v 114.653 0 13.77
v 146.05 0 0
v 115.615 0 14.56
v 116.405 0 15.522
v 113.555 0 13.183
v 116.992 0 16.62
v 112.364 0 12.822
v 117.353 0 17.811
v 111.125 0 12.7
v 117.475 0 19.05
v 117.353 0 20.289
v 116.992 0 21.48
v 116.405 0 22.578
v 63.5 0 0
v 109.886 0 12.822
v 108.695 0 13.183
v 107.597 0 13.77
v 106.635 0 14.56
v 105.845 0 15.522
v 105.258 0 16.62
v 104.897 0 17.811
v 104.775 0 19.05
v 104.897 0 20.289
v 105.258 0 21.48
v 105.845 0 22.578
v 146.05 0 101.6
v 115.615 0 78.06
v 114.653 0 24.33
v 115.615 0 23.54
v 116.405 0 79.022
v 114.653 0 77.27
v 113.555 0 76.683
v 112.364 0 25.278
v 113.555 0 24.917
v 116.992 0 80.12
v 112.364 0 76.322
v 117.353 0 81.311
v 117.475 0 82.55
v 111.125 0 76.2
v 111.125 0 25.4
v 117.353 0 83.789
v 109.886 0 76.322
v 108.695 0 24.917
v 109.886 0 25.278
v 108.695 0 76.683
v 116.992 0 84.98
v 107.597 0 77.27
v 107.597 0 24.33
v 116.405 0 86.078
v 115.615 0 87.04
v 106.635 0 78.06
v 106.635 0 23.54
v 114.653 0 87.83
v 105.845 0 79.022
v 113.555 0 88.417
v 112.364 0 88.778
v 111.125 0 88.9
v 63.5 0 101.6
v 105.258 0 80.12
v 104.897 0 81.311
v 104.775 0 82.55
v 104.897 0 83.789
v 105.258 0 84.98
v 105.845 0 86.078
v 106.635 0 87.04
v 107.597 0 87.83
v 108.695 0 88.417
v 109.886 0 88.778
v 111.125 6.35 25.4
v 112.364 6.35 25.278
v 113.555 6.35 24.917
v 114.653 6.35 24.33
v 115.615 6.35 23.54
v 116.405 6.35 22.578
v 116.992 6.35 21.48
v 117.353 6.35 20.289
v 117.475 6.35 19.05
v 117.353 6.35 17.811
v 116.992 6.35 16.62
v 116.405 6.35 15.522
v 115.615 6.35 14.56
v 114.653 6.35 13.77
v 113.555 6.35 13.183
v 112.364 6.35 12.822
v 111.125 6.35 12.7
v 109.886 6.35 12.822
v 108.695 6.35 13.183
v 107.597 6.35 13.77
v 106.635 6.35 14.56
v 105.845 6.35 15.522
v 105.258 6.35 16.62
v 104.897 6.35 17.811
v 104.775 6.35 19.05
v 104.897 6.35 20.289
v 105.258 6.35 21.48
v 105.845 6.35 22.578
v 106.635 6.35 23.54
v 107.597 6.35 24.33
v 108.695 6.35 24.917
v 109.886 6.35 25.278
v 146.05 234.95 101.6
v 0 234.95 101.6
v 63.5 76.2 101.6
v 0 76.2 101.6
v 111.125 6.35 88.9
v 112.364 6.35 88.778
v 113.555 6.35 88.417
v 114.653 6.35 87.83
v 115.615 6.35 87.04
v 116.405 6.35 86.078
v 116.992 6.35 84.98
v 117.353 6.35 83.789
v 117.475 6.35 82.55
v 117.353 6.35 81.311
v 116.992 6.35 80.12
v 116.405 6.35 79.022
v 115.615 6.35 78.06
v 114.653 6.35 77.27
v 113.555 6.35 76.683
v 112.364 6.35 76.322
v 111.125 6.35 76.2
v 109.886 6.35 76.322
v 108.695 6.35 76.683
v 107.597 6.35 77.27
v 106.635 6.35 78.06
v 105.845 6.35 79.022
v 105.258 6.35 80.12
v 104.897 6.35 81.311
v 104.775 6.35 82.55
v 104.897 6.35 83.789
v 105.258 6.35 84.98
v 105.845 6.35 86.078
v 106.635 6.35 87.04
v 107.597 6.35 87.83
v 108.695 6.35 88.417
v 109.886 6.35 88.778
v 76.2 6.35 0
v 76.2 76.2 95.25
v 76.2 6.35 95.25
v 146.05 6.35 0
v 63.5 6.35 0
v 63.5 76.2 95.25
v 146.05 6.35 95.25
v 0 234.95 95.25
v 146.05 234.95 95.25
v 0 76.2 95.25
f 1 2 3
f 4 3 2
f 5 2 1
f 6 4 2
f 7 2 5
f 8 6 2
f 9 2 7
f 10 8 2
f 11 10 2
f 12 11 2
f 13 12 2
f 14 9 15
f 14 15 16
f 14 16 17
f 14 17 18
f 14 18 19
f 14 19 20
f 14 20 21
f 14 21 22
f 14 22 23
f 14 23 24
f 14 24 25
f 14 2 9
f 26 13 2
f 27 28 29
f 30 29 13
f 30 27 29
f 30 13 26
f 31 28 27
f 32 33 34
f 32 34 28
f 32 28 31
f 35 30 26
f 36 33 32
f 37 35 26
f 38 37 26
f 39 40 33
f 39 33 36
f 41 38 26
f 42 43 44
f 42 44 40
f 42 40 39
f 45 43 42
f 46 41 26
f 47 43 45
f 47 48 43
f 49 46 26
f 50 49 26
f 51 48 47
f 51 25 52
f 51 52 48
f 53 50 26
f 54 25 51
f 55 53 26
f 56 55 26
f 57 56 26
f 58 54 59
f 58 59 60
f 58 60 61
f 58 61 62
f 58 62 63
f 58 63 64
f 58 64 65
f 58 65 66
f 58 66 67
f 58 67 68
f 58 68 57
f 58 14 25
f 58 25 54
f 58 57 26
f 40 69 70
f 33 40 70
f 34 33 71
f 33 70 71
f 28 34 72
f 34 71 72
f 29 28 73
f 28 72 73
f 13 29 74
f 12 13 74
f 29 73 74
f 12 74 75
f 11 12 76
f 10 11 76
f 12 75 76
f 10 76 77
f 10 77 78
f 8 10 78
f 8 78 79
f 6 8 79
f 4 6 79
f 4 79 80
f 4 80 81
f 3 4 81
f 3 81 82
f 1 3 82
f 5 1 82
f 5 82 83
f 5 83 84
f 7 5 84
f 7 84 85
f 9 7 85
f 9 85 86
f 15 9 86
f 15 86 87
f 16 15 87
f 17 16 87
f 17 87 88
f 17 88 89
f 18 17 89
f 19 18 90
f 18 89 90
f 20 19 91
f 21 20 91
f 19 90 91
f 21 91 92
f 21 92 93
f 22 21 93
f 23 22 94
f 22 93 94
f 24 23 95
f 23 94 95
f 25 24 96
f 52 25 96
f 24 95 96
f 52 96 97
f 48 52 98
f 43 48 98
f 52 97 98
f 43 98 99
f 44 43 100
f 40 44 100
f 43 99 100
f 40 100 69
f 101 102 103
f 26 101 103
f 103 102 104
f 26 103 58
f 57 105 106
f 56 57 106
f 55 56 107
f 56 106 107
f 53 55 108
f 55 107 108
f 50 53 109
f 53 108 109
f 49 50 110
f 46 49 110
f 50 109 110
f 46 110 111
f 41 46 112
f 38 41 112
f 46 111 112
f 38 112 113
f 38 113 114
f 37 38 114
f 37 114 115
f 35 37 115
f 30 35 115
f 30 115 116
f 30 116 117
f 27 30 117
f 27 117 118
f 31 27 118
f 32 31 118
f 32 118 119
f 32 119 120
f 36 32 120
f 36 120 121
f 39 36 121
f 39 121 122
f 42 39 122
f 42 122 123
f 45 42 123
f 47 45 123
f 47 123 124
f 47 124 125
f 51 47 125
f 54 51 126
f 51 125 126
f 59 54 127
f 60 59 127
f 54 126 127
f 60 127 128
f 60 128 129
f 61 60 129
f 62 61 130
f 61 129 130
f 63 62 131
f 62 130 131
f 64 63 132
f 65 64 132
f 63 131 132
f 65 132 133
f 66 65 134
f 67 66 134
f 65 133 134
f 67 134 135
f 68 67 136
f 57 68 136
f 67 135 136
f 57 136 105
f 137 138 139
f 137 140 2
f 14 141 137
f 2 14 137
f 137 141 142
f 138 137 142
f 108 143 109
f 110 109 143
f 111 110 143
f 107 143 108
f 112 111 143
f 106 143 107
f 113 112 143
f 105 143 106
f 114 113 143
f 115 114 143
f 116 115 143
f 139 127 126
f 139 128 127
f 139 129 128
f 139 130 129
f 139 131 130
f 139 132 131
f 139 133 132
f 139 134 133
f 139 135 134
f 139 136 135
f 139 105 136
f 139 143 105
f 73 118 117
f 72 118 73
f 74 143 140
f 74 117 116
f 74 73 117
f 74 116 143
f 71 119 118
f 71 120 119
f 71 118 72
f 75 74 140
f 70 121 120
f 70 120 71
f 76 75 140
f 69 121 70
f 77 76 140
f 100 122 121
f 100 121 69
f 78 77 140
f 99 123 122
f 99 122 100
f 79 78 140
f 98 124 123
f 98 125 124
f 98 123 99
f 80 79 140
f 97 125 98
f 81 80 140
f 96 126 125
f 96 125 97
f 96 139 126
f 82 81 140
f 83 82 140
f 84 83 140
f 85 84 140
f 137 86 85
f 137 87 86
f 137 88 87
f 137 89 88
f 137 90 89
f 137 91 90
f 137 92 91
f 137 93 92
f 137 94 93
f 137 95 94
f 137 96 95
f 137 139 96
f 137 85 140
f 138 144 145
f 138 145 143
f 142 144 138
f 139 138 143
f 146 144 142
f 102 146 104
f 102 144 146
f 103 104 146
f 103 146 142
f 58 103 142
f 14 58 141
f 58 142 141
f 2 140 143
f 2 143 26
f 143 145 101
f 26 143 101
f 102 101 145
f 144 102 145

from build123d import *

# Parameters (mm, degrees)
BOSS_EXTRUDE1_DEPTH = 146.05
SKETCH2_W           = 63.5
SKETCH2_H           = 76.2
CUT_EXTRUDE1_DEPTH  = 146.05
BOSS_EXTRUDE2_DEPTH = 12.7
SKETCH4_R           = 6.35
CUT_EXTRUDE2_DEPTH  = 12.7


with BuildPart() as part:
    # Sketch1 → Boss-Extrude1 (new body)
    with BuildSketch(Plane(origin=(0, 0, 0), x_dir=(0, 0, -1), z_dir=(1, 0, 0))):
        Polygon((0, 0), (-101.6, 0), (-101.6, 6.35), (-101.6, 234.95), (-95.25, 234.95), (-95.25, 6.35), (0, 6.35), align=None)
    extrude(amount=BOSS_EXTRUDE1_DEPTH)

    # Sketch2 → Cut-Extrude1 (cut)
    with BuildSketch(Plane.XY.offset(101.6)):
        with Locations((31.75, 38.1)):
            Rectangle(SKETCH2_W, SKETCH2_H)
    extrude(amount=-CUT_EXTRUDE1_DEPTH, mode=Mode.SUBTRACT)

    # Sketch3 → Boss-Extrude2 (add)
    with BuildSketch(Plane.ZY.offset(-63.5)):
        Polygon((0, 6.35), (95.25, 76.2), (95.25, 6.35), align=None)
    extrude(amount=-BOSS_EXTRUDE2_DEPTH)

    # Sketch4 → Cut-Extrude2 (cut)
    with BuildSketch(Plane(origin=(0, 6.35, 0), x_dir=(1, 0, 0), z_dir=(0, 1, 0))):
        with Locations(Location((111.125, -19.05, 0), (0, 0, 270))):
            Circle(SKETCH4_R)
        with Locations(Location((111.125, -82.55, 0), (0, 0, 270))):
            Circle(SKETCH4_R)
    extrude(amount=-CUT_EXTRUDE2_DEPTH, mode=Mode.SUBTRACT)


solid = part.part
